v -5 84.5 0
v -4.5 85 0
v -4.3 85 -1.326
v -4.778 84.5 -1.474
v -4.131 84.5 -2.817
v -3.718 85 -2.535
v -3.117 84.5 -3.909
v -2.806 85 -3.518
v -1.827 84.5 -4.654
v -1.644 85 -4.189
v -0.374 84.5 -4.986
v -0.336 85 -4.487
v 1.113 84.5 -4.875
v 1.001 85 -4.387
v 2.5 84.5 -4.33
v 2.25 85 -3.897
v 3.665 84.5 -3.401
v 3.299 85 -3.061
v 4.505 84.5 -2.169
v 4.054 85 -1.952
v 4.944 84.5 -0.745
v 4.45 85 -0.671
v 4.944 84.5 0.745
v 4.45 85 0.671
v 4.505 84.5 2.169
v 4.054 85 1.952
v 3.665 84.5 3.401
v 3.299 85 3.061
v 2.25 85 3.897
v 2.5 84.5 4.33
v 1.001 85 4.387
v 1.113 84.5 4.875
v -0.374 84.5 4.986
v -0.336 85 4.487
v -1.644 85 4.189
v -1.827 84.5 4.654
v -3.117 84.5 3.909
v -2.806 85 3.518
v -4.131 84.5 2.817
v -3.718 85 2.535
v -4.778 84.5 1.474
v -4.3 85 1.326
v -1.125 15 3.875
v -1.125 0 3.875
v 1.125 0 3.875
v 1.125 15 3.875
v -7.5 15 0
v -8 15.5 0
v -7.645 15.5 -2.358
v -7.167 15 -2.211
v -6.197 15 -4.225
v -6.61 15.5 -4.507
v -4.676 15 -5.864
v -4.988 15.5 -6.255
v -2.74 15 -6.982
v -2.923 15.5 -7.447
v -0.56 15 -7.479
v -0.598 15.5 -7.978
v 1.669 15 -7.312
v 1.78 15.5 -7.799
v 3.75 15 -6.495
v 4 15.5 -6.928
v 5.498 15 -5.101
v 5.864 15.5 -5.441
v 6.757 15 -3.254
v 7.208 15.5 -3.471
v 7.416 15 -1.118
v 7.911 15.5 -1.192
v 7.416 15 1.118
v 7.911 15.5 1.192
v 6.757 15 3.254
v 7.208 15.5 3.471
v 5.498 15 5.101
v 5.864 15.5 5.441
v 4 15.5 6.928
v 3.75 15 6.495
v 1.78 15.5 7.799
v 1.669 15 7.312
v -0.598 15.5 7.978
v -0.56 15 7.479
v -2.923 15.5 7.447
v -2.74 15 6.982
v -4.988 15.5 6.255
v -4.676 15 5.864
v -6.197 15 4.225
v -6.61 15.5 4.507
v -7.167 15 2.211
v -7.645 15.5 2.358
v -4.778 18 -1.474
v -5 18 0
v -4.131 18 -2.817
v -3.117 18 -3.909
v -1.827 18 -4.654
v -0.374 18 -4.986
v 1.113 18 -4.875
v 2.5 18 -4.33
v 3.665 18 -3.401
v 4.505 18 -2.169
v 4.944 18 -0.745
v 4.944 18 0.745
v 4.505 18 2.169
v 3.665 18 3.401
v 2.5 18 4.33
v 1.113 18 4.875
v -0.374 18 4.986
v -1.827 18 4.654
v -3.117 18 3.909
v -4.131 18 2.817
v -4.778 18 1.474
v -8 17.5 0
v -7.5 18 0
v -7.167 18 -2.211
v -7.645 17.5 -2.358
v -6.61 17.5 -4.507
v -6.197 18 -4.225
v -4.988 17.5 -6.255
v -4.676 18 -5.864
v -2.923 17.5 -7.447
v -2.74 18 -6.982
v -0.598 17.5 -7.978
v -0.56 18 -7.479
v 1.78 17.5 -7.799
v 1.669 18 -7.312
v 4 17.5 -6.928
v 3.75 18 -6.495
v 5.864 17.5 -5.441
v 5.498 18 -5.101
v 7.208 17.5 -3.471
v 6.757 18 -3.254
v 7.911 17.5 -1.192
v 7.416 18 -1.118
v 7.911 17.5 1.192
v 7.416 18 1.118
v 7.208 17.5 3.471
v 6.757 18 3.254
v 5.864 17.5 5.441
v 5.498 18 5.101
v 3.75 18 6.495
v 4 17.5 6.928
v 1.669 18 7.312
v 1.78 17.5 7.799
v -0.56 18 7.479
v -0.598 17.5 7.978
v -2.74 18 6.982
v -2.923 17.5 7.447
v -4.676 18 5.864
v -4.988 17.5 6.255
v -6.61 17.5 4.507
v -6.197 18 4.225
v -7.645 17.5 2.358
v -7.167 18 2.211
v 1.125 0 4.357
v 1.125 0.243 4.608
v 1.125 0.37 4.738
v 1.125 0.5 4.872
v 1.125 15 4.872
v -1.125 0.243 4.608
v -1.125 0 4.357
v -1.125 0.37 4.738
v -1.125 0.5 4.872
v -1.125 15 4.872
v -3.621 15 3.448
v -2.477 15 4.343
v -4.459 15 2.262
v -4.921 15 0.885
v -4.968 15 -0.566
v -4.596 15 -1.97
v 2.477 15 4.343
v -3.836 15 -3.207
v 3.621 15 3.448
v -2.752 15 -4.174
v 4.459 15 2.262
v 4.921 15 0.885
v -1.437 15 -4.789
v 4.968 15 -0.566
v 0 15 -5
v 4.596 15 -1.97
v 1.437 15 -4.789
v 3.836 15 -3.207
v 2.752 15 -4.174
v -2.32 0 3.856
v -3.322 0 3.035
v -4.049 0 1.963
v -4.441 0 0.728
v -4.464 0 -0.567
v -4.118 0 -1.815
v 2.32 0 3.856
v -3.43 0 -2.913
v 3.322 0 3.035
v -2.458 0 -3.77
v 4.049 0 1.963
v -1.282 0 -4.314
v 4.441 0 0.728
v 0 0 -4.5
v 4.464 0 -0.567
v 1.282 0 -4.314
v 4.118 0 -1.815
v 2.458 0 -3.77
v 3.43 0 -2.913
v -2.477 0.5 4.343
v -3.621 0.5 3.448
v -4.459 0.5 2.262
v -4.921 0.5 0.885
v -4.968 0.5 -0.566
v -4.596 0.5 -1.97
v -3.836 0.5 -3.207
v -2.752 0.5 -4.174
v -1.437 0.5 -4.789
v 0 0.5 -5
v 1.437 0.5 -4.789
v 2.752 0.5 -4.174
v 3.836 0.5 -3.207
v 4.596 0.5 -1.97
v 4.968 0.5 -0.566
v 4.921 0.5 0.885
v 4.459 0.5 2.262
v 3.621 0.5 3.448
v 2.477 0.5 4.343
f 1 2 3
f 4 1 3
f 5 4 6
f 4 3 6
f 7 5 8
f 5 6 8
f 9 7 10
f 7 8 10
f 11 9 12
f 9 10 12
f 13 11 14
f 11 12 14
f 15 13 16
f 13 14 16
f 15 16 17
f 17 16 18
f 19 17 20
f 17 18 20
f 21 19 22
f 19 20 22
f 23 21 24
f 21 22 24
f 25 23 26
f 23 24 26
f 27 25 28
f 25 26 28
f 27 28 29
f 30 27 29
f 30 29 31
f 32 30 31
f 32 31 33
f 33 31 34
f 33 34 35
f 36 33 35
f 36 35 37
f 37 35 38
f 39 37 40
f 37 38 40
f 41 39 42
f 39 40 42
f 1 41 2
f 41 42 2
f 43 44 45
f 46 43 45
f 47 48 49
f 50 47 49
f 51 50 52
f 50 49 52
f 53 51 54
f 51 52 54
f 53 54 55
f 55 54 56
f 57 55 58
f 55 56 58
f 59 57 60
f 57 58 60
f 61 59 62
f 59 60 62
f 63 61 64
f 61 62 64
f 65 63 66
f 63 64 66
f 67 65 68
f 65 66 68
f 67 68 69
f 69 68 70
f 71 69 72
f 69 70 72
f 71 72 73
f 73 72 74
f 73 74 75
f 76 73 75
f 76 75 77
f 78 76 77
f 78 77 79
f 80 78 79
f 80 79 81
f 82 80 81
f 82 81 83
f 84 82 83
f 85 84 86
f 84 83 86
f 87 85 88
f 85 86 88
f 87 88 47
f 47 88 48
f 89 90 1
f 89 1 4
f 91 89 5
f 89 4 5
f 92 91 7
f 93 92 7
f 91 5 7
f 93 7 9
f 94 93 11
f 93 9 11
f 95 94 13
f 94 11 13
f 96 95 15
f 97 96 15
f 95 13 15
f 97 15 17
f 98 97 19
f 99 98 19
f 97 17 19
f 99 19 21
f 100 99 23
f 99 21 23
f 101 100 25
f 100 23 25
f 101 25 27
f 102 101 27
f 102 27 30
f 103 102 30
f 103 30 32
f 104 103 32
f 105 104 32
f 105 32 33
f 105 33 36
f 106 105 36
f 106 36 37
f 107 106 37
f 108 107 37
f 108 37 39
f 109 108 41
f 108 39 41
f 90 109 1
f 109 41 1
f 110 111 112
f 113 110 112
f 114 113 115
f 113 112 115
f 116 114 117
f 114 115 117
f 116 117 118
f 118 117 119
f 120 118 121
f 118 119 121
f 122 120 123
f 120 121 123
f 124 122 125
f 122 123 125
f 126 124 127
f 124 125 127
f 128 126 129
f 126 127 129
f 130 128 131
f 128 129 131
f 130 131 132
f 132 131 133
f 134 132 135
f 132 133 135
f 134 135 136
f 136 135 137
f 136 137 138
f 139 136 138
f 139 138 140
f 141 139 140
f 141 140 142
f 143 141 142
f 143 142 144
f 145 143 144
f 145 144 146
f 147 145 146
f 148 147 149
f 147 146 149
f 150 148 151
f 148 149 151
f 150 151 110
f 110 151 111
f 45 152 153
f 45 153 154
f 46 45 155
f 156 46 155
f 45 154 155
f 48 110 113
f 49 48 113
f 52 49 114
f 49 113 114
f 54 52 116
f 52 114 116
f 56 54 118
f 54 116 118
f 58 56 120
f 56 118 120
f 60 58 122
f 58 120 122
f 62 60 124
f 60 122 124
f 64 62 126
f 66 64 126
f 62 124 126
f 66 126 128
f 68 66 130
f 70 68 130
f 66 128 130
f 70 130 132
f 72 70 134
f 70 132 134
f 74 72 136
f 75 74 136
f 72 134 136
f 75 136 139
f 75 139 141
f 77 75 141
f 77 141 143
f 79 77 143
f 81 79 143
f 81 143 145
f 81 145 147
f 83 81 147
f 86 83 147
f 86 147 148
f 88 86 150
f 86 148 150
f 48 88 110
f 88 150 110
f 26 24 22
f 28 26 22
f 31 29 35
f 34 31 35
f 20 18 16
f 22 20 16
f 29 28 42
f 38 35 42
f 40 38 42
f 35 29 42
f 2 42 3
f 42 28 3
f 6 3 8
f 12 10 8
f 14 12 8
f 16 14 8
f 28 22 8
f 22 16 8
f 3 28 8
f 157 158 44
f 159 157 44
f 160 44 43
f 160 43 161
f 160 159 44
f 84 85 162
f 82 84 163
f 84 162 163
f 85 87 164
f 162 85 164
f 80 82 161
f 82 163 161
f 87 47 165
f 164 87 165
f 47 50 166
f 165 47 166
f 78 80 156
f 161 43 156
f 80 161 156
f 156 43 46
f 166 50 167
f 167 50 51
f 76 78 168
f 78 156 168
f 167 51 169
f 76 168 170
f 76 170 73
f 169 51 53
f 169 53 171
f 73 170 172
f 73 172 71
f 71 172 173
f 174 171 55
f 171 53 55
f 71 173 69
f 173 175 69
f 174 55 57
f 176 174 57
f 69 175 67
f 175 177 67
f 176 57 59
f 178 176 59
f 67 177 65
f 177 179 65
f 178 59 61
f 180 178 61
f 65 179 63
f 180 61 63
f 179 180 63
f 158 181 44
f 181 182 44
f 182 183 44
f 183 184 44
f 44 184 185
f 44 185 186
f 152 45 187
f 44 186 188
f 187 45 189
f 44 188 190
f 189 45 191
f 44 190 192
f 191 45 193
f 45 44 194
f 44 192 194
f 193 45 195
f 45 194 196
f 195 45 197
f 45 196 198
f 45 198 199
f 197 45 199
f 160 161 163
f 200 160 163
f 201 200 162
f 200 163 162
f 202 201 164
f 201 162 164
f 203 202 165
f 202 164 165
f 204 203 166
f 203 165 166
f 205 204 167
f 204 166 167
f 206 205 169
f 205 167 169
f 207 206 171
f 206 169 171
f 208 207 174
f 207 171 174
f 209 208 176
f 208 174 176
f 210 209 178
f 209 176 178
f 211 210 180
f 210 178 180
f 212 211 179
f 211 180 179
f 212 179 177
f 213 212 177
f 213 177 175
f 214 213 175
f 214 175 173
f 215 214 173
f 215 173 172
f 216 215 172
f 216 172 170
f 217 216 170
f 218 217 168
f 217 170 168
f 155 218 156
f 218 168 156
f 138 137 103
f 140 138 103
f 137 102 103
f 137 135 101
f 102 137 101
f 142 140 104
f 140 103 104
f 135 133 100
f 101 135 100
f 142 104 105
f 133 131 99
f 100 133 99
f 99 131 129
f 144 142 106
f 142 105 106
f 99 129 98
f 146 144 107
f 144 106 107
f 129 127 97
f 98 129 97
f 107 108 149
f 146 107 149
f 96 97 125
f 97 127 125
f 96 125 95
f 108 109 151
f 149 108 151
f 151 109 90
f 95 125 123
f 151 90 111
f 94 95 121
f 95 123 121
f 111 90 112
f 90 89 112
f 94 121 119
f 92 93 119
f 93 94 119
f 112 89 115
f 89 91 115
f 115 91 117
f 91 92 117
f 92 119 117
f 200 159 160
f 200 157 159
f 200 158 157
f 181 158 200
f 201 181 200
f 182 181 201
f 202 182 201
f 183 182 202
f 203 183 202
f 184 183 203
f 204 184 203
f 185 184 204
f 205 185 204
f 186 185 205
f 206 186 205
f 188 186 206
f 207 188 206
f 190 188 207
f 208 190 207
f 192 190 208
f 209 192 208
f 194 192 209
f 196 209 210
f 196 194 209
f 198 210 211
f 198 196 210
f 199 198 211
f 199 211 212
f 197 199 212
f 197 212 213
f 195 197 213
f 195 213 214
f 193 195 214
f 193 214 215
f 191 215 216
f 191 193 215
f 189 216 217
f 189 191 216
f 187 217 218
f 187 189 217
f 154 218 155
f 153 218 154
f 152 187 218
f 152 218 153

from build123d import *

# Parameters (mm, degrees)
SKETCH2_W          = 2.25
SKETCH2_H          = 2.25
CUT_EXTRUDE1_DEPTH = 15
CHAMFER1_SIZE      = 0.5
CHAMFER2_SIZE      = 0.5


with BuildPart() as part:
    # Sketch1 → Revolve1 (revolve)
    with BuildSketch(Plane.XY, mode=Mode.PRIVATE) as revolve1_sk:
        Polygon((0, 0), (5, 0), (5, 15), (8, 15), (8, 18), (5, 18), (5, 85), (0, 85), align=None)
    revolve(revolve1_sk.sketch.rotate(Axis((0, 85, 0), (0, -1, 0)), 180), axis=Axis((0, 85, 0), (0, -1, 0)))

    # Sketch2 → Cut-Extrude1 (cut)
    with BuildSketch(Plane.XZ):
        with Locations((0, 5)):
            Rectangle(SKETCH2_W, SKETCH2_H)
    extrude(amount=-CUT_EXTRUDE1_DEPTH, mode=Mode.SUBTRACT)

    # Chamfer1
    chamfer1_edges = [part.edges().sort_by_distance(p)[0] for p in [
        (8, 18, 0),
        (8, 15, 0),
    ]]
    chamfer(chamfer1_edges, length=CHAMFER1_SIZE)

    # Chamfer2
    chamfer2_edges = [part.edges().sort_by_distance(p)[0] for p in [
        (0, 0, -5),
        (5, 85, 0),
    ]]
    chamfer(chamfer2_edges, length=CHAMFER2_SIZE)


solid = part.part
